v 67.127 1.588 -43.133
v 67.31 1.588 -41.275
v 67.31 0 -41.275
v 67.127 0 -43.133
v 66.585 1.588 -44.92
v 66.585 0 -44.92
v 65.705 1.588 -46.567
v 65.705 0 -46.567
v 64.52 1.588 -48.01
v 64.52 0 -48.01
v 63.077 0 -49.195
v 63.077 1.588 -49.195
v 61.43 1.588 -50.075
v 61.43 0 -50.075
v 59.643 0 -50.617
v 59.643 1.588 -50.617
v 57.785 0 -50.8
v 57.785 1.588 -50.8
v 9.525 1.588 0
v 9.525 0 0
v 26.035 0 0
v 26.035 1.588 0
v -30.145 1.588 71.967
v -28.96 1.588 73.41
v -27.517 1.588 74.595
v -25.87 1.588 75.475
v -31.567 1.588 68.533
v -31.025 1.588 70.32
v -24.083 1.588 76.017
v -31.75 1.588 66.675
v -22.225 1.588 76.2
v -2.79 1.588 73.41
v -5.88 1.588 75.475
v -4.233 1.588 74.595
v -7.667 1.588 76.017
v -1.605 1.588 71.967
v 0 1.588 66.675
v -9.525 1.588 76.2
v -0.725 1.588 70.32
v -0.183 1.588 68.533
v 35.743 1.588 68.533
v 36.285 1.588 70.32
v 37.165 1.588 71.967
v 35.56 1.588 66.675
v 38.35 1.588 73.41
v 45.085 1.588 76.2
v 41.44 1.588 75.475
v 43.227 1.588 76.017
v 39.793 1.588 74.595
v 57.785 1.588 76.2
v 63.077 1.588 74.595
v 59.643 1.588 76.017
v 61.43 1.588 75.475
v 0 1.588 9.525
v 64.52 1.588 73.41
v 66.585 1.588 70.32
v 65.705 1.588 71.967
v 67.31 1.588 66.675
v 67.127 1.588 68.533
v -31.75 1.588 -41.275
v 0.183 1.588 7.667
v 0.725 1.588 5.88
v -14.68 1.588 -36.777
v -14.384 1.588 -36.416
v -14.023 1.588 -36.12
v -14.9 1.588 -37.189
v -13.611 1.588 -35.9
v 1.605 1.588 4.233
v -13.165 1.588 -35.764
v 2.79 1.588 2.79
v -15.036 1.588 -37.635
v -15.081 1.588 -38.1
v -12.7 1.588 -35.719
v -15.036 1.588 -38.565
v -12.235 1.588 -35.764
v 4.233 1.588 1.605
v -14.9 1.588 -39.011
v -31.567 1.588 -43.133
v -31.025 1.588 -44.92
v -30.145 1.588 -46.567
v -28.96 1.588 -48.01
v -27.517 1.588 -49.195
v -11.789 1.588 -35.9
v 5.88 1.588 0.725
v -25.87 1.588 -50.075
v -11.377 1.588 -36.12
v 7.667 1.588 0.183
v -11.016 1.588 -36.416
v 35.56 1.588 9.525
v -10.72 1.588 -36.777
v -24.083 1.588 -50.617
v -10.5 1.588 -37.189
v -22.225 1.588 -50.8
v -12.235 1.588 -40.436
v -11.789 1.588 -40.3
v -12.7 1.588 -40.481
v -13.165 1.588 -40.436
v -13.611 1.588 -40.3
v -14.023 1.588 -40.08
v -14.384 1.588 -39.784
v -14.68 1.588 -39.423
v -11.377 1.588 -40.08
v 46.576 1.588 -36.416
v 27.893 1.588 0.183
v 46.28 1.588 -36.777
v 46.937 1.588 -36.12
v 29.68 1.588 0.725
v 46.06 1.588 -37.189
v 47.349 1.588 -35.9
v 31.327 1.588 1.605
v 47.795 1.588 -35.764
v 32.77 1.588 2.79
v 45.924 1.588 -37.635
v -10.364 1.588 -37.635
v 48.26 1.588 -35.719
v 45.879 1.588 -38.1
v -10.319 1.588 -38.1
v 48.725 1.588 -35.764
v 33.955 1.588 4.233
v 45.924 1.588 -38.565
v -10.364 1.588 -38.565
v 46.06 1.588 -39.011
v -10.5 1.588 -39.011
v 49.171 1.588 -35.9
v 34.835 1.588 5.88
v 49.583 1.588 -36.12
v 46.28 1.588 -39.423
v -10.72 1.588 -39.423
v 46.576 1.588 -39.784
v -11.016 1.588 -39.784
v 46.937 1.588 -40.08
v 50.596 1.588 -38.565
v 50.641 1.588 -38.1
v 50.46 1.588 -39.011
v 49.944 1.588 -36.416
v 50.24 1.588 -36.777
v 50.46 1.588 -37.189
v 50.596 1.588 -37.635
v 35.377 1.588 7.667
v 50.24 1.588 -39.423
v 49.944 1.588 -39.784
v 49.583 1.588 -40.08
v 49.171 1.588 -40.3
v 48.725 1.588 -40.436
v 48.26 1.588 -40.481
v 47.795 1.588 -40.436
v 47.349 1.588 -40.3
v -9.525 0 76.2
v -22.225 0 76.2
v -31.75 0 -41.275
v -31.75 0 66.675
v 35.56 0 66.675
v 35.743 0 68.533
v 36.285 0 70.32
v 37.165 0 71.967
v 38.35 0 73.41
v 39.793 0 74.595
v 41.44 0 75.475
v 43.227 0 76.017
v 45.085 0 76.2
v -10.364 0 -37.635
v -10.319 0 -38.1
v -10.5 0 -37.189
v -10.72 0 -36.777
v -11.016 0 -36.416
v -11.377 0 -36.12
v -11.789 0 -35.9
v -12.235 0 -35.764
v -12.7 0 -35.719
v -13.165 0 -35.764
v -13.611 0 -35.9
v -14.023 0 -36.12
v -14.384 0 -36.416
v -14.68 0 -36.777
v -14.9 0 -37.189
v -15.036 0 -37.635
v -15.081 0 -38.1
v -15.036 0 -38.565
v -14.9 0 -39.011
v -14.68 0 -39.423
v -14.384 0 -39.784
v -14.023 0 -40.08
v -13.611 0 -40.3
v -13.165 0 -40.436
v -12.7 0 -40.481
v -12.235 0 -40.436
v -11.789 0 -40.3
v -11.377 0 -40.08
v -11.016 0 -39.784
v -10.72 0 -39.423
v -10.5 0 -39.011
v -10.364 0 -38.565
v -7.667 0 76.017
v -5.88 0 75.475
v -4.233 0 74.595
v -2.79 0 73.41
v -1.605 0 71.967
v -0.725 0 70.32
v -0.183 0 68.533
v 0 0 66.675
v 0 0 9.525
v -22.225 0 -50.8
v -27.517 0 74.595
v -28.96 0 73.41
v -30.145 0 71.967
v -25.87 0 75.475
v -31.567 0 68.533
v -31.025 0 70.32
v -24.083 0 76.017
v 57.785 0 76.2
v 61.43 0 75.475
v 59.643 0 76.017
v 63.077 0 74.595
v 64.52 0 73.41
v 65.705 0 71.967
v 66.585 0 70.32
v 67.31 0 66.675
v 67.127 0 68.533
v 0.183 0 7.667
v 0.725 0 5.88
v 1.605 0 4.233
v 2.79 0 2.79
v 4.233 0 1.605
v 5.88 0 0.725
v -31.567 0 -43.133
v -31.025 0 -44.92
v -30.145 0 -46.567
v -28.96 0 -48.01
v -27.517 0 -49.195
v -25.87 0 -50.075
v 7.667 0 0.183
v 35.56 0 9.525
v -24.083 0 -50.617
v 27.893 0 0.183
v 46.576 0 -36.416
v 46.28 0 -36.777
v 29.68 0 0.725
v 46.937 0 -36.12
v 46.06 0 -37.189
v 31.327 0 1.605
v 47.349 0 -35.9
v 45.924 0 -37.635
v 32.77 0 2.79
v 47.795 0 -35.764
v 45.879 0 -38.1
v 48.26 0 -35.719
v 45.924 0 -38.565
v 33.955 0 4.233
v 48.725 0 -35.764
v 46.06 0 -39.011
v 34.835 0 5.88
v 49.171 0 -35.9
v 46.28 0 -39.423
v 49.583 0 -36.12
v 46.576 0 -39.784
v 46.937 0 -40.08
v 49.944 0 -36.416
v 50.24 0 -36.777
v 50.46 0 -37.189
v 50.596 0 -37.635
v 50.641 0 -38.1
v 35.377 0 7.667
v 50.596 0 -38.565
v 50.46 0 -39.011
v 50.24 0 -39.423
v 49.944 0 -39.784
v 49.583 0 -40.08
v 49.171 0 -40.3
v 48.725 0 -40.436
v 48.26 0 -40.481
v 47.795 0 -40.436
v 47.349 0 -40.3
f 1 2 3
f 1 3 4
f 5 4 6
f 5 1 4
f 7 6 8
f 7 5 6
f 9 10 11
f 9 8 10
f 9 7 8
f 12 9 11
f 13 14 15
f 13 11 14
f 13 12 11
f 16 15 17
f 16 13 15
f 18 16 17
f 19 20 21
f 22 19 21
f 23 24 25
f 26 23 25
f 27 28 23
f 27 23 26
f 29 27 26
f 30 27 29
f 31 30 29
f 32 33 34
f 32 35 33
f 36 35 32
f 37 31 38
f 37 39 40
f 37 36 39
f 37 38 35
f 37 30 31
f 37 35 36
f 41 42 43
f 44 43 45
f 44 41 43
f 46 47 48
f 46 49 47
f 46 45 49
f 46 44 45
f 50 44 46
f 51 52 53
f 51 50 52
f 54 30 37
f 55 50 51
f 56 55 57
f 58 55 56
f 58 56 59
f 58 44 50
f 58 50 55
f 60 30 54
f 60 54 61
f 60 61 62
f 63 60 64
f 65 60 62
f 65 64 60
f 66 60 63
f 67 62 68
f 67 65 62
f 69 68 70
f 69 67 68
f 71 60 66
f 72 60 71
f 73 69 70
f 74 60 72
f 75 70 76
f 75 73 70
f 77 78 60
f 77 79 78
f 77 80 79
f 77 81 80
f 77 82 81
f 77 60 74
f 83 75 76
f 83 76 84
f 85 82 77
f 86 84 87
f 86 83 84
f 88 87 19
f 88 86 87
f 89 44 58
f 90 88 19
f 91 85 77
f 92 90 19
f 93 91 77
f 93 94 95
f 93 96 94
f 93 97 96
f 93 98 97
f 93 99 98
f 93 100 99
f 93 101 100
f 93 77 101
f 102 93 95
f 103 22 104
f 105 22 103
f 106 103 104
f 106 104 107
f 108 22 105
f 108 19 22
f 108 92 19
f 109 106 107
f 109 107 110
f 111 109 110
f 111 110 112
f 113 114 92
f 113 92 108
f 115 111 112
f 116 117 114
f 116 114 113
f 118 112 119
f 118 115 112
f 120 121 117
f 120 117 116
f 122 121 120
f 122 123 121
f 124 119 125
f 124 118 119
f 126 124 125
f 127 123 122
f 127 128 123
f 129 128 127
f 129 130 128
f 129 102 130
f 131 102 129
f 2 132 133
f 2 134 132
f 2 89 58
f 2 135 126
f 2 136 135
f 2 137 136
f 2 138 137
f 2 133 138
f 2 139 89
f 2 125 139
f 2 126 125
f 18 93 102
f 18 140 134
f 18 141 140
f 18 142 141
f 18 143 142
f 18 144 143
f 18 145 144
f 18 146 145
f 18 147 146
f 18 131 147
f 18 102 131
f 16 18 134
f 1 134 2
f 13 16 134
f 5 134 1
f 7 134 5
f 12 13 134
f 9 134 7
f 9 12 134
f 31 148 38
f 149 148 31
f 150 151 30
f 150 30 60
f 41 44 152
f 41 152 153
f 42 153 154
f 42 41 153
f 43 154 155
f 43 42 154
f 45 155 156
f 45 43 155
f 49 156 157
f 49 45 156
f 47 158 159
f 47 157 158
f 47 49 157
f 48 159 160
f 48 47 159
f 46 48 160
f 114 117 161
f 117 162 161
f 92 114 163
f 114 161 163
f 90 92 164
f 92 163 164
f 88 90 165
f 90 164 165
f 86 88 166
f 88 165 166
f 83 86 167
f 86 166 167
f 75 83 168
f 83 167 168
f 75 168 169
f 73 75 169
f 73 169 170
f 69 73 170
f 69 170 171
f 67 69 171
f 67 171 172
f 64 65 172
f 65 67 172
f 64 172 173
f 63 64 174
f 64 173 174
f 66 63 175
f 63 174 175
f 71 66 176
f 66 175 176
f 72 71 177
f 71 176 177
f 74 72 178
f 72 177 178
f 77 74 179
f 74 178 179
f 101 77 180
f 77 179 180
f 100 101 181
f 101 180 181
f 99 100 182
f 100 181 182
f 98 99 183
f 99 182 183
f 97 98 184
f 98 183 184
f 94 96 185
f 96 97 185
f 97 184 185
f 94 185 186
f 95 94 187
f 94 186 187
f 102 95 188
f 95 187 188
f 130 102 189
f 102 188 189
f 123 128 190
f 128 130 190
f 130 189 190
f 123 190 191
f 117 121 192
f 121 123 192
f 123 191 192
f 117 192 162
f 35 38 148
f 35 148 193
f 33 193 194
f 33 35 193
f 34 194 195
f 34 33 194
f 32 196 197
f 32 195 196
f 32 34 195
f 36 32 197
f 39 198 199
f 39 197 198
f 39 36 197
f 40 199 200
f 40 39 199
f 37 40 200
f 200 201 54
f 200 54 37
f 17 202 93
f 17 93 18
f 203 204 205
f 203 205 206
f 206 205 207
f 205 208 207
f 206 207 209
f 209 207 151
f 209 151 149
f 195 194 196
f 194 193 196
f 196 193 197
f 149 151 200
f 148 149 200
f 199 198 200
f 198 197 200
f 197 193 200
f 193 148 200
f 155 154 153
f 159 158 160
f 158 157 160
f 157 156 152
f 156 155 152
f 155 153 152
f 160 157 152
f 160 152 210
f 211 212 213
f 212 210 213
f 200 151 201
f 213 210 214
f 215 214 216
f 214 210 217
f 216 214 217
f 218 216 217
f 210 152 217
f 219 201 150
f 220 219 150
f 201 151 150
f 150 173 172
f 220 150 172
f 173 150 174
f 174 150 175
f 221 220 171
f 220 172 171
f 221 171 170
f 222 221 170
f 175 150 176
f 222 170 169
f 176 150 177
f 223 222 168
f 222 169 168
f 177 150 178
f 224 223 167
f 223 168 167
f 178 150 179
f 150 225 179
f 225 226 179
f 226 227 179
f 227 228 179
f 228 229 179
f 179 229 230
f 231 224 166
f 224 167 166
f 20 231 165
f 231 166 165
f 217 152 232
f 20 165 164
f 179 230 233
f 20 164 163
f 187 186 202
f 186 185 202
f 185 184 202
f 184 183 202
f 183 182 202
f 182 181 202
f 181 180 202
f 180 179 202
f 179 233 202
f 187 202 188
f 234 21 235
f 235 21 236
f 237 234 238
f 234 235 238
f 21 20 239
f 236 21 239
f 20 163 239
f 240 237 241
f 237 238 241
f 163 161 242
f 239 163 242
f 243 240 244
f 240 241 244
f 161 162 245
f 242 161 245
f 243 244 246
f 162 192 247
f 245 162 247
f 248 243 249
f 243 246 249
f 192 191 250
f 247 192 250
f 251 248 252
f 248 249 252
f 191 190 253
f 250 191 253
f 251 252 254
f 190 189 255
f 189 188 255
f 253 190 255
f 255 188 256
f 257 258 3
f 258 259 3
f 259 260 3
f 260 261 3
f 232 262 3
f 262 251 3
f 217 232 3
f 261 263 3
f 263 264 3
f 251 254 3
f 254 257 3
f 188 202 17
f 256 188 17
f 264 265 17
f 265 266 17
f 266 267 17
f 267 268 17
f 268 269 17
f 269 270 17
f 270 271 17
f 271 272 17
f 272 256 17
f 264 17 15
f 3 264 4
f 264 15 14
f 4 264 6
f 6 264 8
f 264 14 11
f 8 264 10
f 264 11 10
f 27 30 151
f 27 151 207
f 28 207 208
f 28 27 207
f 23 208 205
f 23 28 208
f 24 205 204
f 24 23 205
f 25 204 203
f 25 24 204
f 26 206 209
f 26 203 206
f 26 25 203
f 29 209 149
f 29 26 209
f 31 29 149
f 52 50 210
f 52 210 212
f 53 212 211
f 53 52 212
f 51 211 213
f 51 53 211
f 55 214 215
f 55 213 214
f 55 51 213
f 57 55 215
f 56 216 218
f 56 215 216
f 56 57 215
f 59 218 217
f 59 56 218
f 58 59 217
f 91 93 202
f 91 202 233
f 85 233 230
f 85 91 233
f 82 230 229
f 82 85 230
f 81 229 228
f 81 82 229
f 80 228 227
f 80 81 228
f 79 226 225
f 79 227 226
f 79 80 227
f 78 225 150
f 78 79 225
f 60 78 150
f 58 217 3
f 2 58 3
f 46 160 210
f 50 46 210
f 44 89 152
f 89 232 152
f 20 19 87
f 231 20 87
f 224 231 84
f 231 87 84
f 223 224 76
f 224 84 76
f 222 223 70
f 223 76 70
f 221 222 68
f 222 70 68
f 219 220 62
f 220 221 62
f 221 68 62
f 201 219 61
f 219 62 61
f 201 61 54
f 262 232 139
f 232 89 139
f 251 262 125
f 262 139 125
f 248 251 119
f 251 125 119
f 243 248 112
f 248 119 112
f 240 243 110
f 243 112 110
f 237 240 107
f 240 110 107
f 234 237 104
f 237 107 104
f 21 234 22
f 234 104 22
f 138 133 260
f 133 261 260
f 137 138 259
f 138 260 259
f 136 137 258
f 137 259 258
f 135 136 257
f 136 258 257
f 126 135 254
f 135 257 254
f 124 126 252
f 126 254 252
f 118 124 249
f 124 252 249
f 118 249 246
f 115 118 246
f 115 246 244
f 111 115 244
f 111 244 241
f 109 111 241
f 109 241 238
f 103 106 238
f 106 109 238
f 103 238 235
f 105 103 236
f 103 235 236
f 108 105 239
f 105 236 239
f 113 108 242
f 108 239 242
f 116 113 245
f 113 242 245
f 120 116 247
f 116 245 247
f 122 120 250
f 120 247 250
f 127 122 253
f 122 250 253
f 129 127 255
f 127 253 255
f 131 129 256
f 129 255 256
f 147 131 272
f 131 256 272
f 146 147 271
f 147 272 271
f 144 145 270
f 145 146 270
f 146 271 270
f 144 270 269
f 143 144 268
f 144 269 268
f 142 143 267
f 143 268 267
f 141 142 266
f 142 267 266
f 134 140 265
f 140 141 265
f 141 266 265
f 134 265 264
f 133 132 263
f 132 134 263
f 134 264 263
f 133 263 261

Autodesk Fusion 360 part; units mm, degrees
sketch "Sketch1" plane through (0, 0, 0) normal (0, 1, 0) x (1, 0, 0)
  line L0 (0, 0) -> (35.56, 0)
  line L1 (0, 0) -> (0, -76.2)
  line L2 (35.56, 0) -> (35.56, -76.2)
  line L3 (0, -76.2) -> (-31.75, -76.2)
  line L4 (35.56, -76.2) -> (67.31, -76.2)
  line L5 (-31.75, -76.2) -> (-31.75, 50.8)
  line L6 (67.31, -76.2) -> (67.31, 50.8)
  line L7 (-31.75, 50.8) -> (67.31, 50.8)
  line L8 (-31.75, 50.8) -> (-12.7, 50.8) construction
  line L9 (-12.7, 50.8) -> (-12.7, 38.1) construction
  line L10 (67.31, 50.8) -> (48.26, 50.8) construction
  line L11 (48.26, 50.8) -> (48.26, 38.1) construction
  circle A0 centre (48.26, 38.1) radius 2.3813
  circle A1 centre (-12.7, 38.1) radius 2.3813
  dimension "d2" = 76.2
  dimension "d3" = 76.2
  dimension "d4" = 31.75
  dimension "d5" = 31.75
  dimension "d6" = 127
  dimension "d7" = 127
  dimension "d8" = 19.05
  dimension "d9" = 4.7625
  dimension "d10" = 4.7625
extrude "Extrude1" add sketch "Sketch1" along normal blind 1.5875 makes body 1
fillet "Fillet1" radius 9.525 8 edges at (0, 0.7937, 0) (35.56, 0.7937, 0) (-31.75, 0.7937, 76.2) (0, 0.7937, 76.2) (35.56, 0.7937, 76.2) (67.31, 0.7937, 76.2) (67.31, 0.7937, -50.8) (-31.75, 0.7937, -50.8) on bodies 1
copy_body "Body->Comp1" bodies 1 removing the originals makes body 2 in component "Component"
component "Component" placed x (1, 0, 0) y (0, 1, 0) z (0, 0, 1) at (0, 0, 0)
equation "d11 = ( 1 / 16 ) * 1 in"
